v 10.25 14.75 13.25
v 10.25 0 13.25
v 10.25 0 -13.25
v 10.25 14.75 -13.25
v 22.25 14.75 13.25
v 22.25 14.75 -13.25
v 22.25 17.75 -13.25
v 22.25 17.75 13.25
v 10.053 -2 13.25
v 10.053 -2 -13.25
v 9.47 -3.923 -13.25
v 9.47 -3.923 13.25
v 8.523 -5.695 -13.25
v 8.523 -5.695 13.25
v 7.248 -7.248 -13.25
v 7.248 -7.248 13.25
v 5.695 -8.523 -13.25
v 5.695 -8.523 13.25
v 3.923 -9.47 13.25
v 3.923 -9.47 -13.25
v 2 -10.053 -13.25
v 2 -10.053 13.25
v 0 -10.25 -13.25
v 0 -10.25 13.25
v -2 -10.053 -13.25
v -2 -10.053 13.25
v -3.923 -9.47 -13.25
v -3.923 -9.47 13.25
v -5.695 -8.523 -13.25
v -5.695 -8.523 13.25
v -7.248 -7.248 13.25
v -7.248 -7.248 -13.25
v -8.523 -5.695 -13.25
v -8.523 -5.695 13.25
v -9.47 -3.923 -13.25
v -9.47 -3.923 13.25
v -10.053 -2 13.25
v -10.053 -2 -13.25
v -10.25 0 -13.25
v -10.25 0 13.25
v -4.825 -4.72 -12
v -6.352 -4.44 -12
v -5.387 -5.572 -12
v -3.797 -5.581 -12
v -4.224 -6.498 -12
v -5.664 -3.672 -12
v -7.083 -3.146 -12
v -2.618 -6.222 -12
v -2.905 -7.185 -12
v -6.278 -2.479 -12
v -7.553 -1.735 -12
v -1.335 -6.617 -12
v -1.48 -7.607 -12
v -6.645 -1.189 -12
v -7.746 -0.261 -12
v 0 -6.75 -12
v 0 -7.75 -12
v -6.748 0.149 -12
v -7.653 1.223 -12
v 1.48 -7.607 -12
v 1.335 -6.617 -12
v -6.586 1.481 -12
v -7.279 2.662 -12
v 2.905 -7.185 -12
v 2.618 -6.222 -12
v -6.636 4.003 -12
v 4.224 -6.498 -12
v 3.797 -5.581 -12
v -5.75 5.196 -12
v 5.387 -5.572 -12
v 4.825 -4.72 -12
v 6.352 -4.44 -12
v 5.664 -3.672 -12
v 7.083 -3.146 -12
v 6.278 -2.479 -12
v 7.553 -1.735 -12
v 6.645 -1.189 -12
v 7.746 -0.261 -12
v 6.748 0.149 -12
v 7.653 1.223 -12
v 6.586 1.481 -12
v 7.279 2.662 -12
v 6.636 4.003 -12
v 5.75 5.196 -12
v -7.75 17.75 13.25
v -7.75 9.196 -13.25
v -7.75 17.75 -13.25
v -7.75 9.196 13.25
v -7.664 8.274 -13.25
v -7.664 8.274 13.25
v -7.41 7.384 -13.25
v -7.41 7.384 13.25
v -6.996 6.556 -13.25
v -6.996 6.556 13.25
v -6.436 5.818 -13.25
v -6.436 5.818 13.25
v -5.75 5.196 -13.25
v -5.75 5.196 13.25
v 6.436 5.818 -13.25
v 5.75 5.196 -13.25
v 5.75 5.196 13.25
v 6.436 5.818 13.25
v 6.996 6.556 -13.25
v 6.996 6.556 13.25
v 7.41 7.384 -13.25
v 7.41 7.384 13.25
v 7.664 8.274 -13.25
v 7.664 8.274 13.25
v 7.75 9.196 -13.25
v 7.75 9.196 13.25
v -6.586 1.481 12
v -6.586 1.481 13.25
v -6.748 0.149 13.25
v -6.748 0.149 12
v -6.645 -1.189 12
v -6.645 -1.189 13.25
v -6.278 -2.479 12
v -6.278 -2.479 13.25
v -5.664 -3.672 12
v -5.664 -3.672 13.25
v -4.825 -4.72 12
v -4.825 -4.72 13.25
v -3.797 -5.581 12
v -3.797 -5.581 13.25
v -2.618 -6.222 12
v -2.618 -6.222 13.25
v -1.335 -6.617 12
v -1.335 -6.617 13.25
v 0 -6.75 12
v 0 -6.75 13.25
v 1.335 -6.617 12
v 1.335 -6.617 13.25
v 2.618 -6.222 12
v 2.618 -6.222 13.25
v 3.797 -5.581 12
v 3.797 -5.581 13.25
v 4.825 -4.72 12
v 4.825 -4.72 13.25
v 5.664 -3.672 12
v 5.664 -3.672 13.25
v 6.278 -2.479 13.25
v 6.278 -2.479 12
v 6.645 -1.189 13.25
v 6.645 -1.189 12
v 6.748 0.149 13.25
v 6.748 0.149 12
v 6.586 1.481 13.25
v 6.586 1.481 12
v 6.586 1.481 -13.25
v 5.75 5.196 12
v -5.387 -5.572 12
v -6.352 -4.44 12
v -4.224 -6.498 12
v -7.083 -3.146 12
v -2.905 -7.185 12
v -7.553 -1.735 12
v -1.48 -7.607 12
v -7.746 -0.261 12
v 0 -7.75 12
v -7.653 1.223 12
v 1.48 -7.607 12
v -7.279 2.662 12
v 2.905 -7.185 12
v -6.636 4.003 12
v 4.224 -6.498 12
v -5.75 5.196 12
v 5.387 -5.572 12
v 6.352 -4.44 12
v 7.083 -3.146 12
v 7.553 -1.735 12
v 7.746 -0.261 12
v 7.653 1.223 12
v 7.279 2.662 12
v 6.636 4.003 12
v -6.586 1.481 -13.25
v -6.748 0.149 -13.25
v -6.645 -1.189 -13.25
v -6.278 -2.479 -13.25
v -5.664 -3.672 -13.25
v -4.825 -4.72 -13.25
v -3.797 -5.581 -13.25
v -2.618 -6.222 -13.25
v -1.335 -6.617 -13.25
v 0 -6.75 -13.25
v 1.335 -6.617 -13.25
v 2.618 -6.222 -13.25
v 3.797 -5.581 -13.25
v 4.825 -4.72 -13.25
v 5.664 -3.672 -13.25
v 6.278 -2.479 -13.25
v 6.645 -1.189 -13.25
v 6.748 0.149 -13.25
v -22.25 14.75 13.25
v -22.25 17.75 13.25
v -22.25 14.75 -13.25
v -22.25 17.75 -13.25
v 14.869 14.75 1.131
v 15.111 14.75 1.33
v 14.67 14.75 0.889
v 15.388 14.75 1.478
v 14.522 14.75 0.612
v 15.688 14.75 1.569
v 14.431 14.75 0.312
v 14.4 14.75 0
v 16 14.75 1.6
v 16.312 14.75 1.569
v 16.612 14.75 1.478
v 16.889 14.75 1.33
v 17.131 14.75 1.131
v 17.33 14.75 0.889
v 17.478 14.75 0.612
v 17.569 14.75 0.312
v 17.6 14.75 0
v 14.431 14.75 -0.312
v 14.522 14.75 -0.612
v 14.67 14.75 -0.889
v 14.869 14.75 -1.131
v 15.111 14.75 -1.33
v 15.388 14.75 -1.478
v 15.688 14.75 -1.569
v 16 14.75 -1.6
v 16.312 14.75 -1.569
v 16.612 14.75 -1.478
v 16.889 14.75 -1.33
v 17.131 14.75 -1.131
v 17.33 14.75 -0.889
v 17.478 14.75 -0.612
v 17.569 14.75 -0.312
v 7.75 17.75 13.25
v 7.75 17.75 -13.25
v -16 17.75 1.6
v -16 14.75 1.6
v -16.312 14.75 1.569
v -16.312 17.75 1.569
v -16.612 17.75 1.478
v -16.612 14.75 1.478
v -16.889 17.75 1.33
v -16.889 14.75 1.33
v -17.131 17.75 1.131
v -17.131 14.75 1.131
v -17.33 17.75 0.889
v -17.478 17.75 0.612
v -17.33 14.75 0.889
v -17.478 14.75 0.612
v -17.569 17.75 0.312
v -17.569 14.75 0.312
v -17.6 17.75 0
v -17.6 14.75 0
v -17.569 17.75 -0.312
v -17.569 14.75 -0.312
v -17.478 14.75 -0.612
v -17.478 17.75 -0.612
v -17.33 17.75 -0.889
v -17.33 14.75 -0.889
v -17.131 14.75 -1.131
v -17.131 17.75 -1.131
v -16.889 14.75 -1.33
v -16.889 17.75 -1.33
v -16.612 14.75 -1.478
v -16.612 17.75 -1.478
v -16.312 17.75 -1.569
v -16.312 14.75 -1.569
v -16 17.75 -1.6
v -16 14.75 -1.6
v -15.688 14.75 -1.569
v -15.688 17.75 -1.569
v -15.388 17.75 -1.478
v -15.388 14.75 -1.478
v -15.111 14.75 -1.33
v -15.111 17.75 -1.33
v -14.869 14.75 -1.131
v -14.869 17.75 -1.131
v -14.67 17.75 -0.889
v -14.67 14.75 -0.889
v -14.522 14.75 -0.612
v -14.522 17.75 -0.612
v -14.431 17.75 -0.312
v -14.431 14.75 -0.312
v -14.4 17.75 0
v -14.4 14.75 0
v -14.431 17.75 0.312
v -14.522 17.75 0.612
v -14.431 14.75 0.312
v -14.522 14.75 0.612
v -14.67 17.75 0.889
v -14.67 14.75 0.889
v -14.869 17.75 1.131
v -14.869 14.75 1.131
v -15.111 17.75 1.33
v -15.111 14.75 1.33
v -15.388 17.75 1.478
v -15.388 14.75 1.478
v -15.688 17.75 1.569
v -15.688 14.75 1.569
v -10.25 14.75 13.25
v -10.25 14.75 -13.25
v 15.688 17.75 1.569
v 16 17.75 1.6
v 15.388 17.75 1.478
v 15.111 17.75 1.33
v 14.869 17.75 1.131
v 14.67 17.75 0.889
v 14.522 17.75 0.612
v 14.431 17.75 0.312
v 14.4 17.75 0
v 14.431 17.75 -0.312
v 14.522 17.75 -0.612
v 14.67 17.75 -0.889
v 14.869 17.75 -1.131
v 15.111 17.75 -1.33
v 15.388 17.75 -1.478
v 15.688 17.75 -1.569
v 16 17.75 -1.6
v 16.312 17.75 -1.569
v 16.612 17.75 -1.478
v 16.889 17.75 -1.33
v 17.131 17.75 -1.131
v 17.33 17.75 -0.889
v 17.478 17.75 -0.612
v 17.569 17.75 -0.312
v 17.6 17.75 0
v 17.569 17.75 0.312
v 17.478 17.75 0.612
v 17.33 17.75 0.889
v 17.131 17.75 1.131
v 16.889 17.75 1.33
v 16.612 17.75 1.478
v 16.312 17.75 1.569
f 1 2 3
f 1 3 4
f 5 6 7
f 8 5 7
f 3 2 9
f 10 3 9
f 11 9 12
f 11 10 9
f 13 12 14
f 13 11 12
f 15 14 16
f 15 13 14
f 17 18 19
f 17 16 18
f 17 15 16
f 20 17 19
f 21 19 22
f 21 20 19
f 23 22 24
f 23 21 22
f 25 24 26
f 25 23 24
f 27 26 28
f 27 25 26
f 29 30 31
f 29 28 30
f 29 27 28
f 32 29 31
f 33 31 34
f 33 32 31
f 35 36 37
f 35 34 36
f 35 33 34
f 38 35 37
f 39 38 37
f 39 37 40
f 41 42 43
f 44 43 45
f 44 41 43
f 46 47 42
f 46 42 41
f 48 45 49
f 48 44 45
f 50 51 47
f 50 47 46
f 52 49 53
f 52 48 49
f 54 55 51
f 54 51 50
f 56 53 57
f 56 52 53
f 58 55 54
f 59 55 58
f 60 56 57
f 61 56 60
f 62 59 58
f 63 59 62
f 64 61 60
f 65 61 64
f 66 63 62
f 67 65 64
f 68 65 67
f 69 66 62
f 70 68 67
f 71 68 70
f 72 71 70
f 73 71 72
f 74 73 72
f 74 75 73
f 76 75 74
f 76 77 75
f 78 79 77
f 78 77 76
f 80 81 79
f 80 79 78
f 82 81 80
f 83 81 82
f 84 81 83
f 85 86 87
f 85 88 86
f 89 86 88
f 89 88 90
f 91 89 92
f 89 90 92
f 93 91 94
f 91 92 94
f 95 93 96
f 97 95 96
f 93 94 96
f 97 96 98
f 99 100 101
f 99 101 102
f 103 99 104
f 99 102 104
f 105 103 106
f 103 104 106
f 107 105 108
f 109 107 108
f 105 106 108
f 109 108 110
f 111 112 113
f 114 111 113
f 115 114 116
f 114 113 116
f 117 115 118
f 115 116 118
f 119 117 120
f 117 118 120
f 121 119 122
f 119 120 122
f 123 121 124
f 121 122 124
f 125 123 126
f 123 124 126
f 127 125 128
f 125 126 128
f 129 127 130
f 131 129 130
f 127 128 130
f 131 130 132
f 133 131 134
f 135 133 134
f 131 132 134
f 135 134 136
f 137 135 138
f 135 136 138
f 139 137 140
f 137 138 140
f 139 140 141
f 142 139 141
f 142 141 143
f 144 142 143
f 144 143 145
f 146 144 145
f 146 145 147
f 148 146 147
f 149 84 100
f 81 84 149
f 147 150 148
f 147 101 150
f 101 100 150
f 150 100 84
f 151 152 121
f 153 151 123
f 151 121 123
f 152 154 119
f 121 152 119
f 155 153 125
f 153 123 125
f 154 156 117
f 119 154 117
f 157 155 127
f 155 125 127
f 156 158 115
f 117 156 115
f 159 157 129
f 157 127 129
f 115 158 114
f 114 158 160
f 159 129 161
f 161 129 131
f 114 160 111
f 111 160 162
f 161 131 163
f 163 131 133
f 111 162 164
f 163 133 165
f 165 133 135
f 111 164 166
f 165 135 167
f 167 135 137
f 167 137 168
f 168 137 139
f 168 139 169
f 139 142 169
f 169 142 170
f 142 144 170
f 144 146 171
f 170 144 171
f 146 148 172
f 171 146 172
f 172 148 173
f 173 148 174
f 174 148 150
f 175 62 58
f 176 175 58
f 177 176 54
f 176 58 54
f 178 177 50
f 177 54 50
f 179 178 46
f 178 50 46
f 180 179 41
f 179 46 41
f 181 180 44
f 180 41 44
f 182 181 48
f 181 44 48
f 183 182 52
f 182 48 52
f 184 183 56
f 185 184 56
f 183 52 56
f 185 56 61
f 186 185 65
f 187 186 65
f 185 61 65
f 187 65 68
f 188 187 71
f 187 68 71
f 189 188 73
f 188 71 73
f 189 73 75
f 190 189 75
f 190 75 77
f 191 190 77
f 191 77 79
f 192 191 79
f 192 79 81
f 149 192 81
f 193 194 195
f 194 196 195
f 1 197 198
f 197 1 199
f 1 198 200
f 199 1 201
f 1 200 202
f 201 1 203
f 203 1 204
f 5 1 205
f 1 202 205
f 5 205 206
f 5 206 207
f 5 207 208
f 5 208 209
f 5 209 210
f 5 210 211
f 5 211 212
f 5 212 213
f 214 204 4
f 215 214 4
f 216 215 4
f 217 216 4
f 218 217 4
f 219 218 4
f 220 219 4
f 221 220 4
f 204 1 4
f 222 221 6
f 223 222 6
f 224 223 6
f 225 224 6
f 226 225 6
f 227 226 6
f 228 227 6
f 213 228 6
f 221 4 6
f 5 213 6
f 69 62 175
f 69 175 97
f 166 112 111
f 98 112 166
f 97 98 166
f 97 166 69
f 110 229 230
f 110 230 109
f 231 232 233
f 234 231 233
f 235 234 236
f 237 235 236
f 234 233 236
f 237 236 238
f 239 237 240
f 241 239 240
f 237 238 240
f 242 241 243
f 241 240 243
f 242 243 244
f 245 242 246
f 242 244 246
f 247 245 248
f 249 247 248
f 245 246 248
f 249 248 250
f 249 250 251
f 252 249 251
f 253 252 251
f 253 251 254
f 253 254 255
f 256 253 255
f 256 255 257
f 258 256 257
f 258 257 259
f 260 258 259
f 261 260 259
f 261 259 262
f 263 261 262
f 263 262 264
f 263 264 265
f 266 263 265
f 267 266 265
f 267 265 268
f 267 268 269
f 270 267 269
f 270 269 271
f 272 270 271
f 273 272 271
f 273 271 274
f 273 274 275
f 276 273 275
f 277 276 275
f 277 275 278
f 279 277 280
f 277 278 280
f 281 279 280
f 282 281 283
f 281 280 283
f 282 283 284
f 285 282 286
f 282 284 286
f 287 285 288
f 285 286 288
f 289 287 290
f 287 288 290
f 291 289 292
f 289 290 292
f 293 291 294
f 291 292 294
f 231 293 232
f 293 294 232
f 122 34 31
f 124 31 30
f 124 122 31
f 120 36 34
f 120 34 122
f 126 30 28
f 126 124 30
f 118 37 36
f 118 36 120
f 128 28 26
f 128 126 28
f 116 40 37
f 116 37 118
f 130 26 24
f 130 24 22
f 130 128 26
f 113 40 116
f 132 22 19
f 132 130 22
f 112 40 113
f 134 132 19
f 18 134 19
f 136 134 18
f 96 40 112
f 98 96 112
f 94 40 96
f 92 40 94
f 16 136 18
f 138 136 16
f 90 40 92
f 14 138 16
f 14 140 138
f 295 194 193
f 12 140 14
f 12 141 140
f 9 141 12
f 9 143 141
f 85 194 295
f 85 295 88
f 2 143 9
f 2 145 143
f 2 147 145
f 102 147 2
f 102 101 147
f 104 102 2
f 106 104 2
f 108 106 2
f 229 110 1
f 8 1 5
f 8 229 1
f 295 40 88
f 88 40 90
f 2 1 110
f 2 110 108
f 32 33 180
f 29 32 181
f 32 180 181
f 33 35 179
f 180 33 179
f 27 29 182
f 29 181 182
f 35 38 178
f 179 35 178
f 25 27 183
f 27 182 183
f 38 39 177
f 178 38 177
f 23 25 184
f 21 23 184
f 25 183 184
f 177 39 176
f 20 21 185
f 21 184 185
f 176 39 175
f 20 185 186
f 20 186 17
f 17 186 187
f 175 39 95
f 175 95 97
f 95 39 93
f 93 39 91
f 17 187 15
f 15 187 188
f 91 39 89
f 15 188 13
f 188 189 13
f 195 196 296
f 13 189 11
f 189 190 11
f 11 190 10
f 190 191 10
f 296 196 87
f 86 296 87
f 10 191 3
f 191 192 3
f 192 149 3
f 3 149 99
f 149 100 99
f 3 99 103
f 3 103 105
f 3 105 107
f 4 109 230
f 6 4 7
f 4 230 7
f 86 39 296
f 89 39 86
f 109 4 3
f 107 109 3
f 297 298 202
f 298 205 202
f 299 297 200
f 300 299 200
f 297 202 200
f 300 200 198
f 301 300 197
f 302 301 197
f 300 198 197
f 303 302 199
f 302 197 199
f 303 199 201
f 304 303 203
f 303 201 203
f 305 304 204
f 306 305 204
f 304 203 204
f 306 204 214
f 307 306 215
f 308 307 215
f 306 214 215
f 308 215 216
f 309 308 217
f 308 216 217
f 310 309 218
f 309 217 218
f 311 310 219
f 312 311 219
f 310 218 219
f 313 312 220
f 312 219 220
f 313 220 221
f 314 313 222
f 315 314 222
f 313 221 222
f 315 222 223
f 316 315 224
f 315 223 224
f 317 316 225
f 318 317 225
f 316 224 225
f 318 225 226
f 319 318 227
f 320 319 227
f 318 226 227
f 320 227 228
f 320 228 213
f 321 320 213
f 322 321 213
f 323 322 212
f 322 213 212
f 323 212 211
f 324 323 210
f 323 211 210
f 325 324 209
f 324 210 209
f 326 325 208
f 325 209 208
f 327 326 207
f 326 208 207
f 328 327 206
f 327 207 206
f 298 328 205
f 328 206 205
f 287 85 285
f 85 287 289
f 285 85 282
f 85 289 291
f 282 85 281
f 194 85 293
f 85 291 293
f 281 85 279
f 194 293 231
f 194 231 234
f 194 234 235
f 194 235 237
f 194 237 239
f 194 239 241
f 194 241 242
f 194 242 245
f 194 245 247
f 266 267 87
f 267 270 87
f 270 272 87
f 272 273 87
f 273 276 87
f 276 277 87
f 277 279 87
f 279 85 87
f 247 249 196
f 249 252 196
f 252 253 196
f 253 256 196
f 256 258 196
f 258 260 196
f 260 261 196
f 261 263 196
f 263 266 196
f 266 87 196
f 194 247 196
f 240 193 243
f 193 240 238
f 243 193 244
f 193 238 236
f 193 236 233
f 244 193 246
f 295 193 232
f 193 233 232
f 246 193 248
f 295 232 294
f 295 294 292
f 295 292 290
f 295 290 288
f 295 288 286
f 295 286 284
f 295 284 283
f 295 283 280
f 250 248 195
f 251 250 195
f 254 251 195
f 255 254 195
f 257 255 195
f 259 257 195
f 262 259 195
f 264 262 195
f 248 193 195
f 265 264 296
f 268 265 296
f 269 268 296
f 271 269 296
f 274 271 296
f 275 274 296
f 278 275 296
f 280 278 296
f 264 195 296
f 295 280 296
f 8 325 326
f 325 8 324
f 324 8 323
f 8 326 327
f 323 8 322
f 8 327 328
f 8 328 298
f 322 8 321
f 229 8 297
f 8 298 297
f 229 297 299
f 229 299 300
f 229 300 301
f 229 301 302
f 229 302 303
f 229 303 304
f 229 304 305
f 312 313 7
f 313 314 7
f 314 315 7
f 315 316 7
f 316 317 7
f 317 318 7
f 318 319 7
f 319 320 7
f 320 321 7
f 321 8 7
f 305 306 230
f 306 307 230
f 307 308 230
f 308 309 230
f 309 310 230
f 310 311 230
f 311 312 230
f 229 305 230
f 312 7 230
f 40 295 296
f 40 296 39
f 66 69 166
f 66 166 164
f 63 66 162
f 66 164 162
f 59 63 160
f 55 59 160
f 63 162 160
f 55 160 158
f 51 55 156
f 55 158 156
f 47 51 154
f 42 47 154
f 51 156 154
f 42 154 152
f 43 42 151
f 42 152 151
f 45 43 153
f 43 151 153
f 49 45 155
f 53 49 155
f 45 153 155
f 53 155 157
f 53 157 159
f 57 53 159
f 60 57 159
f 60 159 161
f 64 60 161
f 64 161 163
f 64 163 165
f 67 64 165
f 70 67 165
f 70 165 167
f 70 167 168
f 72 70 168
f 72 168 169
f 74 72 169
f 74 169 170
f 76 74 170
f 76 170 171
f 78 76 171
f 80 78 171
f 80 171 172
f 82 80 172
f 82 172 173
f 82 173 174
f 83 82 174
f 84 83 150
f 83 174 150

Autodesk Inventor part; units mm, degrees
ref_plane "YZ Plane" through (0, 0, 0) normal (1, 0, 0) x (0, 1, 0)
ref_plane "XZ Plane" through (0, 0, 0) normal (0, 1, 0) x (-1, 0, 0)
ref_plane "XY Plane" through (0, 0, 0) normal (0, 0, 1) x (1, 0, 0)
sketch "Sketch1" plane through (0, 0, 0) normal (0, 0, 1) x (1, 0, 0)
  line L0 (-22.25, 17.75) -> (-22.25, 14.75)
  line L1 (-22.25, 14.75) -> (-10.25, 14.75)
  line L2 (-10.25, 14.75) -> (-10.25, 0)
  arc A0 (-10.25, 0) -> (10.25, 0) centre (0, 0) ccw
  line L3 (10.25, 0) -> (10.25, 14.75)
  line L4 (10.25, 14.75) -> (22.25, 14.75)
  line L5 (22.25, 14.75) -> (22.25, 17.75)
  line L6 (22.25, 17.75) -> (-22.25, 17.75)
  point P0 (0, 17.75)
  dimension "d0" = 44.5
  dimension "d1" = 10.25
  dimension "d2" = 3
  dimension "d3" = 17.75
extrude "Extrusion1" add sketch "Sketch1" along normal mid plane 26.5
sketch "Sketch2" plane through (0, 0, 13.25) normal (0, 0, 1) x (1, 0, 0)
  line L0 (-22.25, 17.75) -> (-22.25, 14.75) construction
  line L1 (-22.25, 14.75) -> (-10.25, 14.75) construction
  line L2 (-10.25, 14.75) -> (-10.25, 0) construction
  arc A0 (-10.25, 0) -> (10.25, 0) centre (0, 0) ccw construction
  line L3 (10.25, 0) -> (10.25, 14.75) construction
  line L4 (10.25, 14.75) -> (22.25, 14.75) construction
  line L5 (22.25, 14.75) -> (22.25, 17.75) construction
  line L6 (22.25, 17.75) -> (-22.25, 17.75) construction
  line L7 (-7.75, 17.75) -> (7.75, 17.75)
  line L8 (7.75, 17.75) -> (7.75, 9.1962)
  arc A1 (5.75, 5.1962) -> (7.75, 9.1962) centre (2.75, 9.1962) ccw
  line L9 (5.75, 5.1962) -> (6.5855, 1.4811)
  arc A2 (-6.5855, 1.4811) -> (6.5855, 1.4811) centre (0, 0) ccw
  line L10 (-6.5855, 1.4811) -> (-5.75, 5.1962)
  arc A3 (-7.75, 9.1962) -> (-5.75, 5.1962) centre (-2.75, 9.1962) ccw
  line L11 (-7.75, 9.1962) -> (-7.75, 17.75)
  line L12 (22.25, 17.75) -> (-22.25, 17.75) projected
  point P0 (0, 17.75)
  dimension "d6" = 5
  dimension "d7" = 6.75
  dimension "d8" = 2.5
  dimension "d9" = 11.5
  dimension "d10" = 7.75
extrude "Extrusion2" cut sketch "Sketch2" against normal blind 26.5
sketch "Sketch3" plane through (0, 0, 0) normal (0, 0, 1) x (1, 0, 0)
  circle A0 centre (0, 0) radius 7.75
  dimension "d13" = 15.5
extrude "Extrusion3" cut sketch "Sketch3" along normal mid plane 24
sketch "Sketch4" plane through (-22.25, 17.75, 13.25) normal (0, 1, 0) x (1, 0, 0)
  line L0 (0, 26.5) -> (14.5, 26.5) projected
  line L1 (44.5, 26.5) -> (44.5, 0) projected
  point P0 (22.25, 13.25)
  point P1 (0, 0)
  point P2 (6.25, 13.25)
  point P3 (38.25, 13.25)
  dimension "d16" = 6.25
  dimension "d17" = 13.25
  dimension "d19" = 6.25
hole "Hole1" at (-16, 17.75, 0) at (16, 17.75, 0) direction (0, -1, 0) diameter 3.2 end through all
equation "\"d19\" = d16"
properties part number "Heated Bed Bearing Mount"
